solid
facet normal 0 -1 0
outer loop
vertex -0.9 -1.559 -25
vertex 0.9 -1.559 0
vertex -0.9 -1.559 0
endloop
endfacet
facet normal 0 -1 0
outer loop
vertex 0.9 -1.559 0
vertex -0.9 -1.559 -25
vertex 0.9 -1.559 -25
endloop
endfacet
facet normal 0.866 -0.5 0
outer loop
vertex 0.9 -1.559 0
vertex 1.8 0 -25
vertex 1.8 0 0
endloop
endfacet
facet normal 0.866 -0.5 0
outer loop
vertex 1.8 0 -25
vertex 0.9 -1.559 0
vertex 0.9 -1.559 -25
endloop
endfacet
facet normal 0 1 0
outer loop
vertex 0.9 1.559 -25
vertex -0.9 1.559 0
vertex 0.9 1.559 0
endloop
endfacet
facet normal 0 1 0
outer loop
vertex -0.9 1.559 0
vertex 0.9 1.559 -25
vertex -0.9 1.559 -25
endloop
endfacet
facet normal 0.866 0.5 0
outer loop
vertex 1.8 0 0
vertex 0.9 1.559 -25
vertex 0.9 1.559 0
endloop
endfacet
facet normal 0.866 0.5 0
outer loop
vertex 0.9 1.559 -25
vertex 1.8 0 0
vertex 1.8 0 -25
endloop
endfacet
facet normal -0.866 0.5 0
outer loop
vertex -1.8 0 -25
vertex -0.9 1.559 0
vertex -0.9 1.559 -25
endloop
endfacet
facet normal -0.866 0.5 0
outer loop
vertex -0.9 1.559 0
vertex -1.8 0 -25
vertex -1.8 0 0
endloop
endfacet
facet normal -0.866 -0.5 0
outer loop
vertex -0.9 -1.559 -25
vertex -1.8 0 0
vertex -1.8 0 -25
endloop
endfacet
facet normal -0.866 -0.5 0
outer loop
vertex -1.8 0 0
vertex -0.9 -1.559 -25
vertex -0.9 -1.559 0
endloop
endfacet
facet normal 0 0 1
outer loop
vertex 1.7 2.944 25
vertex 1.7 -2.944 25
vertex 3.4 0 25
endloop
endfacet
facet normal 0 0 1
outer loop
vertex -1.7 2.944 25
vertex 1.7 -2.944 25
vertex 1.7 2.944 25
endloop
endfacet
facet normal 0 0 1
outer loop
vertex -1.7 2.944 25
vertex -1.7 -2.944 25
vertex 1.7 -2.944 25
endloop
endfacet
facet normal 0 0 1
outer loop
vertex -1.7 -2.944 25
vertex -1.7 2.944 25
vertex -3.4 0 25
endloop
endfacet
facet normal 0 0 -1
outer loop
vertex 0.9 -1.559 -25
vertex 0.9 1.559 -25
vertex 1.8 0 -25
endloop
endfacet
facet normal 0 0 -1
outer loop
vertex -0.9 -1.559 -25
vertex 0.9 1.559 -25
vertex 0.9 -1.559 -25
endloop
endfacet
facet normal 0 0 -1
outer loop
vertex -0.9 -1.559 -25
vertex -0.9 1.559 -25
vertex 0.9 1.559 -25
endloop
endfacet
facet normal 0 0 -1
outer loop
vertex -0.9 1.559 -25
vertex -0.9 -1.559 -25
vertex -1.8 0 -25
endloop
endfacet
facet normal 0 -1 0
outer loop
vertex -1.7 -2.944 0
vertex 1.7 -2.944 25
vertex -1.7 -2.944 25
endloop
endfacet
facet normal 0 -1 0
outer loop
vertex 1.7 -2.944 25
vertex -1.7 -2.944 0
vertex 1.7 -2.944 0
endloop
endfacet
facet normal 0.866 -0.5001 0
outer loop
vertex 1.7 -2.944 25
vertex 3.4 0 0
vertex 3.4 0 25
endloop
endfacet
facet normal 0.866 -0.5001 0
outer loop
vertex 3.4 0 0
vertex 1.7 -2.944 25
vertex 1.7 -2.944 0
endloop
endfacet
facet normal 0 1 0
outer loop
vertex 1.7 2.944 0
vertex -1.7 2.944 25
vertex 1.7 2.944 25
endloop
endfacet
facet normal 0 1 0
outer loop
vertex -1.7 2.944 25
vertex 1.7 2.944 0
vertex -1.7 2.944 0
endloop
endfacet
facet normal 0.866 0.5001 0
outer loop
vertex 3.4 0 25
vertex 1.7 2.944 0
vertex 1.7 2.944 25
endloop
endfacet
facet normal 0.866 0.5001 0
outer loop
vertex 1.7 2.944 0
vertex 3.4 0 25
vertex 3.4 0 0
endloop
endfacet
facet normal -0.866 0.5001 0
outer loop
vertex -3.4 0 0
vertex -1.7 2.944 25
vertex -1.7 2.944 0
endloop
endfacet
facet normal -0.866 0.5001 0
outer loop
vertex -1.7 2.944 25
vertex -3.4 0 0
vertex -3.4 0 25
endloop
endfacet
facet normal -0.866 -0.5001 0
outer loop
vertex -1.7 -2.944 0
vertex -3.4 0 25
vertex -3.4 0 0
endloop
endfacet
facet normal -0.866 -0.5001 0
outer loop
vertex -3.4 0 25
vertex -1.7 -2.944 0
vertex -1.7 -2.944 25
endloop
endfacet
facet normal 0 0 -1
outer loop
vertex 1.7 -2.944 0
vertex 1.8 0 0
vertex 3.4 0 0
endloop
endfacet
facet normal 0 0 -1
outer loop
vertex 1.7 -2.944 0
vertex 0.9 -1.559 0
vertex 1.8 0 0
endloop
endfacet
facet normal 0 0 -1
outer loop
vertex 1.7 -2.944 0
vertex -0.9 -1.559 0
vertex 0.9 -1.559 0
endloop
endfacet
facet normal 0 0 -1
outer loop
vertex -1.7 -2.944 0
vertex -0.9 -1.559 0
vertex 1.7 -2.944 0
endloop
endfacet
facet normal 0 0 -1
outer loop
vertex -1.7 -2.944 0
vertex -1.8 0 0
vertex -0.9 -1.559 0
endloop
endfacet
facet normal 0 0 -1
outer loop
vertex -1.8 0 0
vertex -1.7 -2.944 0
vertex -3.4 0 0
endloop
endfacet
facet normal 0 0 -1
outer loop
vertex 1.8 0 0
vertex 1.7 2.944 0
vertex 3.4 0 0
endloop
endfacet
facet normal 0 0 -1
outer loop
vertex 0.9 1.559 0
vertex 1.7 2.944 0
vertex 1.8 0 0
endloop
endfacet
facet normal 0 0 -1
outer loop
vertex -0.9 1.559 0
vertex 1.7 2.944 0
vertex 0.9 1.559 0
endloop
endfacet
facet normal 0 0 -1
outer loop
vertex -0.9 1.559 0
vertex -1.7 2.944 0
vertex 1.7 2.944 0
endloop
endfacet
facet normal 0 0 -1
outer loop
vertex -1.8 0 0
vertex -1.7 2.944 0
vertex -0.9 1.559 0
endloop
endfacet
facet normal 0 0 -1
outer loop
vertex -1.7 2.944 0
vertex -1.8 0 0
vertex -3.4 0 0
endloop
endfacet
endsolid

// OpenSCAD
half_connection_hole(0);

// =================================================
// === LIB STARTS HERE =============================

// now it's M3 with round head
module half_connection_hole(h=0, l=50){       
  // h=H/2-2.5-0.55; 
        translate([0,0,0]) cylinder(h=l, r=1.8, center=true);
        translate([0,0,h]) cylinder(h=l/2, r=3.4, $fn=6);
}
